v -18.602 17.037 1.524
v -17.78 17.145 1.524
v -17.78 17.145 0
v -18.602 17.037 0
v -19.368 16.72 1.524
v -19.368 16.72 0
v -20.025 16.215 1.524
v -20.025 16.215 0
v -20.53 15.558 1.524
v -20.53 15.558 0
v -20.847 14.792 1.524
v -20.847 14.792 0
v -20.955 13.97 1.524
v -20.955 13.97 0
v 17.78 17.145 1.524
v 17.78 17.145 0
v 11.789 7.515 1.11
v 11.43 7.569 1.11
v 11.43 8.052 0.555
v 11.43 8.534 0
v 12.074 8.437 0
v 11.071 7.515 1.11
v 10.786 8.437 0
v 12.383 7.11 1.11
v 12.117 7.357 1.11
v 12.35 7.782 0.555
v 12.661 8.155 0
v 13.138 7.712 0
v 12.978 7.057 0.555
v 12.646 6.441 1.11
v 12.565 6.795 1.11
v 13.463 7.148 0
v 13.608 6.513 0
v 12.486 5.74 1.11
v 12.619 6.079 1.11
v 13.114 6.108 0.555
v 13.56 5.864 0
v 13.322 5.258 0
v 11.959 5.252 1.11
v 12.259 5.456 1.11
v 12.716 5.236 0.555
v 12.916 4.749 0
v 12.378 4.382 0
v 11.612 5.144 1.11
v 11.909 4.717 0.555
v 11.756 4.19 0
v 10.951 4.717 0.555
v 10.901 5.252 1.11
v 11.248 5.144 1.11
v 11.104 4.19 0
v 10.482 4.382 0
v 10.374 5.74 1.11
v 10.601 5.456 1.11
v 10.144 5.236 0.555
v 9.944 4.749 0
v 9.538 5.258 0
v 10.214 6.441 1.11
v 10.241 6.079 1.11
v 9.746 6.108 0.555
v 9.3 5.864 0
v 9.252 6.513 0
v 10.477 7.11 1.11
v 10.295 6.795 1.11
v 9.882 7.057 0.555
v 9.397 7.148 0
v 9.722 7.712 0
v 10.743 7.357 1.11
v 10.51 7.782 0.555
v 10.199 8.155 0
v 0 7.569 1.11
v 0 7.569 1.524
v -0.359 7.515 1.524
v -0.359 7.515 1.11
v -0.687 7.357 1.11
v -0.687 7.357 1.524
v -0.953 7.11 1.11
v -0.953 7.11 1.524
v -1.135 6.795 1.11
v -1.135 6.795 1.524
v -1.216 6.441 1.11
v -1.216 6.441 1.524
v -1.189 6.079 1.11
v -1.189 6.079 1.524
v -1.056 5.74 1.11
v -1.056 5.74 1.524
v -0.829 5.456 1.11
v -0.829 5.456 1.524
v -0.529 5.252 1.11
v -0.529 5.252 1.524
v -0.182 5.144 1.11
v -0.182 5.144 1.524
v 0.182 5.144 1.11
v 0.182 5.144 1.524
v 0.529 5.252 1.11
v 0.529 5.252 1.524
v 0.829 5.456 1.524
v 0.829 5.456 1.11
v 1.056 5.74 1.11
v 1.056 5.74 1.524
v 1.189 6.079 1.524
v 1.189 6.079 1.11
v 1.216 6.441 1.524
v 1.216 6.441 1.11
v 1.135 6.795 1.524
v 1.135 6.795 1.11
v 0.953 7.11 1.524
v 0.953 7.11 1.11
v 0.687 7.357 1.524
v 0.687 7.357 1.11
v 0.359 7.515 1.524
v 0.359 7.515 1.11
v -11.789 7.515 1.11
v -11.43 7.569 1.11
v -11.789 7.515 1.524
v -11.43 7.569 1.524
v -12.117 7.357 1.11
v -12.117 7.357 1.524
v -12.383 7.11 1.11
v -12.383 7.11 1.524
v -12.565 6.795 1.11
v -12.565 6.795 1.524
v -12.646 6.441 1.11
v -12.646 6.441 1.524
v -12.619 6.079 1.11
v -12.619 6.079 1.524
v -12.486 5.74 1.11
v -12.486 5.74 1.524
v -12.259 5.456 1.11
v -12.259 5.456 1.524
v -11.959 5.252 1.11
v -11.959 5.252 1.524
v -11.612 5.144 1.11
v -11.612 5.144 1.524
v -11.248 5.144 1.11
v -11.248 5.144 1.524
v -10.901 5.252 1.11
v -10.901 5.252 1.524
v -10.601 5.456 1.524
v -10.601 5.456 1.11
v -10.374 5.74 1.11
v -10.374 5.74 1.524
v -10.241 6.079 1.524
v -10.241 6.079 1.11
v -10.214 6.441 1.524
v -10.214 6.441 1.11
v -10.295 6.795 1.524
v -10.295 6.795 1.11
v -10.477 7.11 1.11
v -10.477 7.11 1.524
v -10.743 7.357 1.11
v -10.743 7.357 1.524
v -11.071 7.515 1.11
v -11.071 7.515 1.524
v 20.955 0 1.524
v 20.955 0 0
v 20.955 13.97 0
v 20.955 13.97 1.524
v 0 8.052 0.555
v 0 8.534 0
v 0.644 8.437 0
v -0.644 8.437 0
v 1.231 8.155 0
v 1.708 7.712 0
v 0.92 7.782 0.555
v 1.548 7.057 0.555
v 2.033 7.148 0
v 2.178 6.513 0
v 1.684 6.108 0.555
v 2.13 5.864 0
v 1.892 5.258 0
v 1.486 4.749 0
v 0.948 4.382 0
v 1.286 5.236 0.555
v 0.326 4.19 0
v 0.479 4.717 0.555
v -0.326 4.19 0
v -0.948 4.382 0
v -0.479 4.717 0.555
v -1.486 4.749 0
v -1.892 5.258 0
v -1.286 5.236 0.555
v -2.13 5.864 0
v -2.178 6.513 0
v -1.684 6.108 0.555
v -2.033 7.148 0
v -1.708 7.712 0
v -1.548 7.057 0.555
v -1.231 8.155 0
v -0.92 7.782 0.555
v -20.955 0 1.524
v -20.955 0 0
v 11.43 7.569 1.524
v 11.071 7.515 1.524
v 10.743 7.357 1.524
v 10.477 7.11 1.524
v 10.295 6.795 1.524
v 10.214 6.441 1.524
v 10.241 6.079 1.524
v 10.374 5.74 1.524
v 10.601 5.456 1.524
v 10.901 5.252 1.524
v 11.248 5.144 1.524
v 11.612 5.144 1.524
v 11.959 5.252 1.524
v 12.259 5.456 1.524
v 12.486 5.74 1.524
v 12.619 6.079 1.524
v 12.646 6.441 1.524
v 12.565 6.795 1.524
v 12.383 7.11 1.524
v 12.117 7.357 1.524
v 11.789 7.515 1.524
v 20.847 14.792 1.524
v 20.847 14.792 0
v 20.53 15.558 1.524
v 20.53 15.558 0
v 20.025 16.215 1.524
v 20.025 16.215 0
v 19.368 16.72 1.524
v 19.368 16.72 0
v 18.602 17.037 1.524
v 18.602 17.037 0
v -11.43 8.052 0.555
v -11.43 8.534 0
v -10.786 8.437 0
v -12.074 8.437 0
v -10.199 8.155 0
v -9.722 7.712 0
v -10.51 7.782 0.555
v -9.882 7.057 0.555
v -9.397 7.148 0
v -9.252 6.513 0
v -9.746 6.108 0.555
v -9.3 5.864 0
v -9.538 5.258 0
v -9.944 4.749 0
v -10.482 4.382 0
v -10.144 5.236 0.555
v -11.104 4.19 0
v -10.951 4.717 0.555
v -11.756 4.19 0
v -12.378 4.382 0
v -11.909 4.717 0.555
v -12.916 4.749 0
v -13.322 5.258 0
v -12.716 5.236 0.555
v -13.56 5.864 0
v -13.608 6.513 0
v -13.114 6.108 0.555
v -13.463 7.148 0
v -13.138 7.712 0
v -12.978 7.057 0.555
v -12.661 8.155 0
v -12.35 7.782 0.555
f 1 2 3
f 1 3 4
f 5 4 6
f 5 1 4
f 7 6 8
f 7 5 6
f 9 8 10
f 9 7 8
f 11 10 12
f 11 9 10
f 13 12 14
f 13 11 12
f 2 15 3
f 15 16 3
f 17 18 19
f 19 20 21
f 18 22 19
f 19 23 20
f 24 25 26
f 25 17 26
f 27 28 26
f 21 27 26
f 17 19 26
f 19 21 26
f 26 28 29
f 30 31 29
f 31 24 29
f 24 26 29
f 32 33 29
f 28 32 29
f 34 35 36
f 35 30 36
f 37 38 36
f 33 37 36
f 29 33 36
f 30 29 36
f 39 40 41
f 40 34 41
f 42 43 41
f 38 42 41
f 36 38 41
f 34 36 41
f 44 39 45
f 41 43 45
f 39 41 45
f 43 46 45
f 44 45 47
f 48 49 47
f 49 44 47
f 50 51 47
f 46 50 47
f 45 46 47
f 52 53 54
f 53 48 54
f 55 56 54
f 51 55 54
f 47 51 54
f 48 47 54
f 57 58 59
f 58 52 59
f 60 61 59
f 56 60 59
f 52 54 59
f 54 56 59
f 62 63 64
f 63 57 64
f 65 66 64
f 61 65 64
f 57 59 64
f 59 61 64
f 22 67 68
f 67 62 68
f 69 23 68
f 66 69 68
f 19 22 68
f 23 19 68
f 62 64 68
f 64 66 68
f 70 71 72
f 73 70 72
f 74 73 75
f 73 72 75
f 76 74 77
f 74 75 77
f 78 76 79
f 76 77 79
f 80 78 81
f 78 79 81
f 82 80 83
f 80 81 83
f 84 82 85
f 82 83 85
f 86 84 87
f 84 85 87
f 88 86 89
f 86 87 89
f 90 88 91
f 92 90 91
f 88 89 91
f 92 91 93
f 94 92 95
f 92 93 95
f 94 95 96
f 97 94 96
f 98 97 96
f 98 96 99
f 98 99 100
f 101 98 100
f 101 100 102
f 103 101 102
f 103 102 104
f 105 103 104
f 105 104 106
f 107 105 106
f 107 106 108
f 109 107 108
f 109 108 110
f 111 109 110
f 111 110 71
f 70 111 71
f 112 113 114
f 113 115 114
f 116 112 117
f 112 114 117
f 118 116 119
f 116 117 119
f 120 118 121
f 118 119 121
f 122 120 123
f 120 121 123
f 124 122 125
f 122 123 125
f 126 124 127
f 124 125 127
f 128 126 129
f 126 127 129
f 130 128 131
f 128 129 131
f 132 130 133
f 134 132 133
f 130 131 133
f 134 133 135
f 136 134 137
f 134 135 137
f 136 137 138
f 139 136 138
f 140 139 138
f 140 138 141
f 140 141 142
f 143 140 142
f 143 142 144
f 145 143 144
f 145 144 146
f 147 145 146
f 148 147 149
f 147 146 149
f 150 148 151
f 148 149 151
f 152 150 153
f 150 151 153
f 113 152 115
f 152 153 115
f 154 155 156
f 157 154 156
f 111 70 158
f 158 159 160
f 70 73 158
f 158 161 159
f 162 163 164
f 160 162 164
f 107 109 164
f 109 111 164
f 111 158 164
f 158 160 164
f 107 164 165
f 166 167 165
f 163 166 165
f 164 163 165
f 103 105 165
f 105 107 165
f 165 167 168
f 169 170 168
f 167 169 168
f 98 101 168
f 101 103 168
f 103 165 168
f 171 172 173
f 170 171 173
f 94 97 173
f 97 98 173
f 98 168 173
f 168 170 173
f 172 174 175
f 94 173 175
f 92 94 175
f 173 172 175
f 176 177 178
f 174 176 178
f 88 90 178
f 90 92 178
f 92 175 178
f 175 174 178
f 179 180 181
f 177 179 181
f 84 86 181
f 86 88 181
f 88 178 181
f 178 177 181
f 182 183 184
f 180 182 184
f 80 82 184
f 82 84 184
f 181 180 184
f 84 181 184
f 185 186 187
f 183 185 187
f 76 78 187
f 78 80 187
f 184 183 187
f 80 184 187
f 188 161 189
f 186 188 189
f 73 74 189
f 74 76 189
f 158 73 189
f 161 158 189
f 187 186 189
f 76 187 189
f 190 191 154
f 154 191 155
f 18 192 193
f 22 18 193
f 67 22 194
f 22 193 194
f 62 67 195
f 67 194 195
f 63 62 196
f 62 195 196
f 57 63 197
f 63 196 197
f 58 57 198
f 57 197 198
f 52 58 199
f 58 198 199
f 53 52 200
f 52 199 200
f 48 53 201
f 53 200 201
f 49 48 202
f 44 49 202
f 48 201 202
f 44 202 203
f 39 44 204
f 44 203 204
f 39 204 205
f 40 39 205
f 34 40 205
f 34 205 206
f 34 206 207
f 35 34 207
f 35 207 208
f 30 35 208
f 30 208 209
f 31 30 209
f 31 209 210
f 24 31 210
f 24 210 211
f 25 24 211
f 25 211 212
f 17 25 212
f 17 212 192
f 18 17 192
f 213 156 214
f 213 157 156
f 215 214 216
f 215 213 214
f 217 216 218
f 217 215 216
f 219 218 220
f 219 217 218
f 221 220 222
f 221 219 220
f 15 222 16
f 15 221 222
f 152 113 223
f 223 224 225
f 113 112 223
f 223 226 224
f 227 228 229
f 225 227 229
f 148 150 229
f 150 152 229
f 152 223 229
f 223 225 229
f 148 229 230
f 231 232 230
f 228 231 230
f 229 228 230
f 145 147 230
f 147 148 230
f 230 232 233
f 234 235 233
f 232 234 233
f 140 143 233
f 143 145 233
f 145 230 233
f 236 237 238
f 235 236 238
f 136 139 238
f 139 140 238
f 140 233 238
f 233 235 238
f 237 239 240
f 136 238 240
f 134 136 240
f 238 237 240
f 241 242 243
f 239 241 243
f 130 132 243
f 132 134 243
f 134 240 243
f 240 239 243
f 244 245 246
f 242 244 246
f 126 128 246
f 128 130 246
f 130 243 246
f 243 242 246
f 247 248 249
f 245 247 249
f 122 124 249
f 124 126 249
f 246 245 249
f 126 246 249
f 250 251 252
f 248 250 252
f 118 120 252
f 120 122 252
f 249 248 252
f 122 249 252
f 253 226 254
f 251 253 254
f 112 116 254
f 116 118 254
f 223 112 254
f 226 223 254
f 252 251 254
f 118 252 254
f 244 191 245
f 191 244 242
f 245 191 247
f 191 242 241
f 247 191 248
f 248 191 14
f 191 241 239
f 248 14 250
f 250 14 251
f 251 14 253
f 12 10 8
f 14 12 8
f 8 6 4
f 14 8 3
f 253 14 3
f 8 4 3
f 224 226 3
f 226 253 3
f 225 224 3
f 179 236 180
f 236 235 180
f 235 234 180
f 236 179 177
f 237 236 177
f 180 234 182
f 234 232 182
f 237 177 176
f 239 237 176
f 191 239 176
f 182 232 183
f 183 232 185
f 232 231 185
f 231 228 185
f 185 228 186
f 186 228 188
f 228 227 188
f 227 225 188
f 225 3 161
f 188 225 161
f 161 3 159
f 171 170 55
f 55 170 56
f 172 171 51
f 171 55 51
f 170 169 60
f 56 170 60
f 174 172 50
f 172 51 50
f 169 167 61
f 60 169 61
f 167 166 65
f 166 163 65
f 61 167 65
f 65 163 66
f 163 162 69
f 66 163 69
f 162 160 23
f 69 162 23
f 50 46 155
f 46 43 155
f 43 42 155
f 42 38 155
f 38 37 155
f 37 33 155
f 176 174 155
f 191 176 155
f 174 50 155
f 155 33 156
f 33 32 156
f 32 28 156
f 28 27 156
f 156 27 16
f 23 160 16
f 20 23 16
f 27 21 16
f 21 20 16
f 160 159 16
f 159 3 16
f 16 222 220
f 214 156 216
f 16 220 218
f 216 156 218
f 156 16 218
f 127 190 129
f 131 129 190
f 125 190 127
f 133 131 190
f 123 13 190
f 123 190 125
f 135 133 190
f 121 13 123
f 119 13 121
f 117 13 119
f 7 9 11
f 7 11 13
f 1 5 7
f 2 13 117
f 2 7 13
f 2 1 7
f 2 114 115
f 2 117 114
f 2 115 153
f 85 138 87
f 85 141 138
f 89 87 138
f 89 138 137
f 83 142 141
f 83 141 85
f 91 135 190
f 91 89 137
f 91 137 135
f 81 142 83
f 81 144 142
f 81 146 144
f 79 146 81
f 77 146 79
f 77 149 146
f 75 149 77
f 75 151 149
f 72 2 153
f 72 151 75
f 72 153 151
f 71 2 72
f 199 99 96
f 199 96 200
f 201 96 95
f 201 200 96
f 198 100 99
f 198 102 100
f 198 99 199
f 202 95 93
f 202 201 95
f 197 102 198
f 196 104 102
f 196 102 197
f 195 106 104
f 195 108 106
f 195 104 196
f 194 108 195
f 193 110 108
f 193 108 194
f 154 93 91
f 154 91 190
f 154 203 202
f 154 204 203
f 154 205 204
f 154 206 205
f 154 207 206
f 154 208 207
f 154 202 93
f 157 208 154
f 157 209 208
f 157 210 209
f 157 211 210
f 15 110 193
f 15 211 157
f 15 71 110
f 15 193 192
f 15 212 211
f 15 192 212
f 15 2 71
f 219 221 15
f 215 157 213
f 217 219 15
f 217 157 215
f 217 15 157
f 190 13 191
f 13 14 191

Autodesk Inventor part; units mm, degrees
ref_plane "YZ Plane" through (0, 0, 0) normal (1, 0, 0) x (0, 1, 0)
ref_plane "XZ Plane" through (0, 0, 0) normal (0, 1, 0) x (-1, 0, 0)
ref_plane "XY Plane" through (0, 0, 0) normal (0, 0, 1) x (1, 0, 0)
sketch "Sketch1" plane through (0, 0, 0) normal (0, 0, 1) x (1, 0, 0)
  line L0 (0, 20.574) -> (0, -3.429) projected
  line L1 (-29.337, 0) -> (29.337, 0) projected
  line L2 (20.955, 17.145) -> (-20.955, 17.145)
  line L3 (-20.955, 17.145) -> (-20.955, 0)
  line L4 (-20.955, 0) -> (20.955, 0)
  line L5 (20.955, 0) -> (20.955, 17.145)
  line L6 (20.955, 17.145) -> (-20.955, 0) construction
  line L7 (-20.955, 17.145) -> (20.955, 0) construction
  point P0 (0, 0)
  point P1 (0, 8.5725)
  point P2 (-11.43, 6.35)
  point P3 (0, 6.35)
  point P4 (11.43, 6.35)
  dimension "d0" = 41.91
  dimension "d1" = 17.145
  dimension "d2" = 11.43
  dimension "d3" = 11.43
  dimension "d4" = 6.35
extrude "Extrusion1" add sketch "Sketch1" along normal blind 1.524
fillet "Fillet1" radius 3.175 2 edges at (20.955, 17.145, 0.762) (-20.955, 17.145, 0.762)
hole "Hole1" at (-11.43, 6.35, 0) at (0, 6.35, 0) at (11.43, 6.35, 0) direction (0, 0, 1) diameter 2.4384 end through all countersink diameter 4.3688 countersink angle 82 clearance for "Flat Head Machine Screw (82)" size "#2" standard "Ansi Unified Screw Threads"
properties material "DELRIN 100, BLACK (EXTRUDED)"
